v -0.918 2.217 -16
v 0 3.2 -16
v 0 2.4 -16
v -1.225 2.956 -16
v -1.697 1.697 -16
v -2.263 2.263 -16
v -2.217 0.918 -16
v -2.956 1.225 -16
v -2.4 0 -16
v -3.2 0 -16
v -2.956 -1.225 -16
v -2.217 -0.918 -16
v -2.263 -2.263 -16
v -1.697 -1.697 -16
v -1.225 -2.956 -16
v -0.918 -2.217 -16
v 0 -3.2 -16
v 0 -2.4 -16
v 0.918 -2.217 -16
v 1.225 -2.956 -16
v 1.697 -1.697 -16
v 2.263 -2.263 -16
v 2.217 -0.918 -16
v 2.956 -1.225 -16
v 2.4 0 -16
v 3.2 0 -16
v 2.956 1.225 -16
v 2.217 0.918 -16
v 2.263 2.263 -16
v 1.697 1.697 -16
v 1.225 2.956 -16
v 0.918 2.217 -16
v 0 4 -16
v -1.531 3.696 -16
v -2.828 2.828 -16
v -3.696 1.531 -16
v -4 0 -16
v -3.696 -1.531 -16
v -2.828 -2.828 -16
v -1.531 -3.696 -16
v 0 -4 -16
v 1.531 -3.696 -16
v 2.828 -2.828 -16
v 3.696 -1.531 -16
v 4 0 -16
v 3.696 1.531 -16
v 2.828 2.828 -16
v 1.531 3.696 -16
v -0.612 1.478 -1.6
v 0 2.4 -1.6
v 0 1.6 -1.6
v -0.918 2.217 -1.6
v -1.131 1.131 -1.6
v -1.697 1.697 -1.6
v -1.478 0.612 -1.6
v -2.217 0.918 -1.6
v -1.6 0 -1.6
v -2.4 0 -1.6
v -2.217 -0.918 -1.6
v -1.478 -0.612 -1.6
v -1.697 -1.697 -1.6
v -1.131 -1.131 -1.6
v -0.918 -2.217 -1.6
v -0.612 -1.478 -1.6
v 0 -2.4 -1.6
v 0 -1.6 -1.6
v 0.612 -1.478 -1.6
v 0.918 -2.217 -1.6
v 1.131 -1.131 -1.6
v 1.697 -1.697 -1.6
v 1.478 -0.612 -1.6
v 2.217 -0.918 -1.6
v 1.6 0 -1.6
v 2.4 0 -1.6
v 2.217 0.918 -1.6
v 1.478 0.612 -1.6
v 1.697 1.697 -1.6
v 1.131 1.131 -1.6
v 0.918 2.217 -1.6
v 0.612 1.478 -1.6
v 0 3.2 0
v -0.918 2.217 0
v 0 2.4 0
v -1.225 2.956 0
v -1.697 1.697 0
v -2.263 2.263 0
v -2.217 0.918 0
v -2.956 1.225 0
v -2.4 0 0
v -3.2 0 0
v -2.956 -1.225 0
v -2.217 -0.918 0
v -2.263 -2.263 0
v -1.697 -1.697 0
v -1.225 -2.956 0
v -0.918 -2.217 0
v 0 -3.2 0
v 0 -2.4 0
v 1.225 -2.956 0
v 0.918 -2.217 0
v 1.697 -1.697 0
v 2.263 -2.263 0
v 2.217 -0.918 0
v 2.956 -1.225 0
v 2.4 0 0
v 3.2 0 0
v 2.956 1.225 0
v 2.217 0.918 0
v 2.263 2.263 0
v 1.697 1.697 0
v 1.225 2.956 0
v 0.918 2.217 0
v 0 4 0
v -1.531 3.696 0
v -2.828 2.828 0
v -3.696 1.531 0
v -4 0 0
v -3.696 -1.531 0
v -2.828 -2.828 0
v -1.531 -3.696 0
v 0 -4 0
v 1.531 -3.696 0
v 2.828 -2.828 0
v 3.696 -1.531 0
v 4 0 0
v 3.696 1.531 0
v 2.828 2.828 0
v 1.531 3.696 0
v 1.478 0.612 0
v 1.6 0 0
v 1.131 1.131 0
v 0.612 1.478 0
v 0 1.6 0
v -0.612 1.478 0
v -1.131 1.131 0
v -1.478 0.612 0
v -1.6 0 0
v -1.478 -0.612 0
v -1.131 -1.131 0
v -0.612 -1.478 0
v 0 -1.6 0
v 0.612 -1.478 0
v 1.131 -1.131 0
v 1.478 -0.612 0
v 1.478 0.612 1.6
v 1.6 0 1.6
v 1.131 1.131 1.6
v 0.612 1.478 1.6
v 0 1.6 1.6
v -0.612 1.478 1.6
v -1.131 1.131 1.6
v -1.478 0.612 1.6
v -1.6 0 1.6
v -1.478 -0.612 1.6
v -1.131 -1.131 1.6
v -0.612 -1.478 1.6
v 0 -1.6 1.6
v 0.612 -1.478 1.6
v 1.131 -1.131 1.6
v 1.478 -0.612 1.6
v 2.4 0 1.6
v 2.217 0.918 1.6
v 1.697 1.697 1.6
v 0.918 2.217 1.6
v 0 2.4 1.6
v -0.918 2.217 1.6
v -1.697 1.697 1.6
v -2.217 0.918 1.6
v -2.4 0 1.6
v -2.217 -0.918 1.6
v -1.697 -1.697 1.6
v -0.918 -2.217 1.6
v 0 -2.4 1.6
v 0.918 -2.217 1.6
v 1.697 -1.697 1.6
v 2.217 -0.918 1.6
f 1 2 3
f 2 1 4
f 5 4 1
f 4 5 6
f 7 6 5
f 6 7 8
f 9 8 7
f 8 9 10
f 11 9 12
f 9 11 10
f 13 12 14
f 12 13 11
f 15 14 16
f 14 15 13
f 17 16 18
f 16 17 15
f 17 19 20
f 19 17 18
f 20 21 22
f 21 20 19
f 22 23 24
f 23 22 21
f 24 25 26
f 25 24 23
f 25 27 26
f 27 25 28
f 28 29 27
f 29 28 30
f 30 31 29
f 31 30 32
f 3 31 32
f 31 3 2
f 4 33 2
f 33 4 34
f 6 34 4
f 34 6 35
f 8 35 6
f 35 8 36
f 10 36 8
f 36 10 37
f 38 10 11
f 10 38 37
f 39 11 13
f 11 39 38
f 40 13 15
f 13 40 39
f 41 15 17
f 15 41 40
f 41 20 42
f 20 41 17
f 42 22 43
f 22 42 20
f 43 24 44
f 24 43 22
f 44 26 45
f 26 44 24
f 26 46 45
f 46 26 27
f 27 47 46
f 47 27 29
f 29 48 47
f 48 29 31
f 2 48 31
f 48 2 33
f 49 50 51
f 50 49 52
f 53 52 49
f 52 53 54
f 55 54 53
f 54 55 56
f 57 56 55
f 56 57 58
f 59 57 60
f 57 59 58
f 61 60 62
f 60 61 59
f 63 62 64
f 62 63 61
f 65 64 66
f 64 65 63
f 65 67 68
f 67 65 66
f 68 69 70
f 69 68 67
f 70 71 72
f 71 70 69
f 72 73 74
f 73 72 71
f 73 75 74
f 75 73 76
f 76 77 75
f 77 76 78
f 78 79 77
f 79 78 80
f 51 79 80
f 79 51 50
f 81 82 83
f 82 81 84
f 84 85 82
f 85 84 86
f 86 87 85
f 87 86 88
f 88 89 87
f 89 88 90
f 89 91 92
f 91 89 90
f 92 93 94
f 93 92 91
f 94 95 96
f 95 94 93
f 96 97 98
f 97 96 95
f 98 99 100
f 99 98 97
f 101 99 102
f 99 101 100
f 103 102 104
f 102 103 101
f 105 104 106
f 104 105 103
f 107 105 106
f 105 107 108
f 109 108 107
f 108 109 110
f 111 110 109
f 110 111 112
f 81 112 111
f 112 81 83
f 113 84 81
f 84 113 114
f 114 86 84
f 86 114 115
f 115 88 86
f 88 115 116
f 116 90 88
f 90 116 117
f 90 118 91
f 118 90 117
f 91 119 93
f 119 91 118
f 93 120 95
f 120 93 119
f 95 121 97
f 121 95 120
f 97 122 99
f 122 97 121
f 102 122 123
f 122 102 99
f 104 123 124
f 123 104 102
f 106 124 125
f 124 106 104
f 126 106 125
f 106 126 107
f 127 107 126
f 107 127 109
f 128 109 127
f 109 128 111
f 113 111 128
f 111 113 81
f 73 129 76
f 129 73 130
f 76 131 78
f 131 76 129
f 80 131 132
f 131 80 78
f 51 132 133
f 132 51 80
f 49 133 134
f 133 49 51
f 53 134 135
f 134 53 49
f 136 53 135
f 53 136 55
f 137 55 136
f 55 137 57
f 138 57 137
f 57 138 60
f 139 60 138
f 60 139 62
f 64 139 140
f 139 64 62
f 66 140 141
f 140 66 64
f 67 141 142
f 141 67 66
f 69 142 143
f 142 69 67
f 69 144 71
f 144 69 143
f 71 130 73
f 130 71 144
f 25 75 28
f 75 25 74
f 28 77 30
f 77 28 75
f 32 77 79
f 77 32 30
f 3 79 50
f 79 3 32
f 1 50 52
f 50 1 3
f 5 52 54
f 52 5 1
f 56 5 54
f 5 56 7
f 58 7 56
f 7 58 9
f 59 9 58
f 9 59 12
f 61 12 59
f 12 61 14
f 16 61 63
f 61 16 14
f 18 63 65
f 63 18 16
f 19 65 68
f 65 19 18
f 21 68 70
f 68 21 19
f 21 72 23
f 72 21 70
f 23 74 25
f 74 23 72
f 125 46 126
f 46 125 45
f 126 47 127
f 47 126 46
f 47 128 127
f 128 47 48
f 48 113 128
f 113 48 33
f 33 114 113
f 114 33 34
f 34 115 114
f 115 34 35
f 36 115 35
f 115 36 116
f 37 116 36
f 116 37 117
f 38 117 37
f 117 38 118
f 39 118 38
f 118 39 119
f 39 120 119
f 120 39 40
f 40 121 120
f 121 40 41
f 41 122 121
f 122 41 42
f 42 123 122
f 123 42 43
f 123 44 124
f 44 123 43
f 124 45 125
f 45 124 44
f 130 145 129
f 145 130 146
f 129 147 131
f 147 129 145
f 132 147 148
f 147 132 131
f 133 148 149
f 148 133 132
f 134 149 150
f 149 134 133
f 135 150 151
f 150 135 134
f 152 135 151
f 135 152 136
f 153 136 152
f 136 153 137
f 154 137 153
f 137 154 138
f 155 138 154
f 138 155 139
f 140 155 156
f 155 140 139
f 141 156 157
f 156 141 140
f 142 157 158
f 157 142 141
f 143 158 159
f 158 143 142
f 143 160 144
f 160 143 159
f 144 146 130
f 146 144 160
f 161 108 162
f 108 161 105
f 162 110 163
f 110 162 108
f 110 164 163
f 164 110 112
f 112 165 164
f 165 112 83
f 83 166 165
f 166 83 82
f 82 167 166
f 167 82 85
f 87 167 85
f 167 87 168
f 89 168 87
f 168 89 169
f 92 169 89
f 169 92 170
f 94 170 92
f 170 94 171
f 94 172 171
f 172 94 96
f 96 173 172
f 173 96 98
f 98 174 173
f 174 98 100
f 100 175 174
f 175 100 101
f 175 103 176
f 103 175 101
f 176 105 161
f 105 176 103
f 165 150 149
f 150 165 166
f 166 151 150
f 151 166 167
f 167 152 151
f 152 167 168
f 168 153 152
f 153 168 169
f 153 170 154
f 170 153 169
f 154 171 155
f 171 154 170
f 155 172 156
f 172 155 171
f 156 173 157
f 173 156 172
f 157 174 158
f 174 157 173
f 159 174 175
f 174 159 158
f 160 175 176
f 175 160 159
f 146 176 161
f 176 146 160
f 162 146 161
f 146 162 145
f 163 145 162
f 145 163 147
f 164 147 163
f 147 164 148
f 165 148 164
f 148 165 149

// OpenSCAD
// file: ../p/stud2a.scad
use <../lib.scad>
use <4-4cyli.scad>
use <4-4edge.scad>
use <4-4ring2.scad>
function ldraw_lib__stud2a() = [
// 0 Stud Open without Base Edges
// 0 Name: stud2a.dat
// 0 Author: James Jessiman
// 0 !LDRAW_ORG Primitive UPDATE 2009-02
// 0 !LICENSE Licensed under CC BY 4.0 : see CAreadme.txt
// 
// 0 BFC CERTIFY CCW
  [0,"BFC","CERTIFY"],
  [0,"BFC","CCW"],
// 
// 0 !HISTORY 1999-07-05 [PTadmin] Official Update 1999-05
// 0 !HISTORY 2002-04-04 [sbliss] Modified for BFC compliance
// 0 !HISTORY 2002-04-25 [PTadmin] Official Update 2002-02
// 0 !HISTORY 2007-06-24 [PTadmin] Header formatted for Contributor Agreement
// 0 !HISTORY 2008-07-01 [PTadmin] Official Update 2008-01
// 0 !HISTORY 2009-06-21 [cwdee] Update ring references to 4-4ring
// 0 !HISTORY 2009-09-03 [PTadmin] Official Update 2009-02
// 
// 
// 1 16 0 -4 0 4 0 0 0 1 0 0 0 4 4-4edge.dat
  [1,16,0,-4,0,4,0,0,0,1,0,0,0,4, ldraw_lib__4_4edge()],
// 1 16 0 -4 0 6 0 0 0 1 0 0 0 6 4-4edge.dat
  [1,16,0,-4,0,6,0,0,0,1,0,0,0,6, ldraw_lib__4_4edge()],
// 0 BFC INVERTNEXT
  [0,"BFC","INVERTNEXT"],
// 1 16 0 -4 0 4 0 0 0 4 0 0 0 4 4-4cyli.dat
  [1,16,0,-4,0,4,0,0,0,4,0,0,0,4, ldraw_lib__4_4cyli()],
// 1 16 0 -4 0 6 0 0 0 4 0 0 0 6 4-4cyli.dat
  [1,16,0,-4,0,6,0,0,0,4,0,0,0,6, ldraw_lib__4_4cyli()],
// 1 16 0 -4 0 2 0 0 0 1 0 0 0 2 4-4ring2.dat
  [1,16,0,-4,0,2,0,0,0,1,0,0,0,2, ldraw_lib__4_4ring2()],
// 0
];
module ldraw_lib__stud2a(step=0, col=false, unit=2/5, alt=false, line=0.2, solid=!$preview)
    makepoly(ldraw_lib__stud2a(), step=step, col=col, unit=unit, alt=alt, line=line, solid=solid);
ldraw_lib__stud2a(line=0.2);
// file: ../p/4-4ring4.scad
use <../lib.scad>
function ldraw_lib__4_4ring4() = [
// 0 Ring  4 x 1.0
// 0 Name: 4-4ring4.dat
// 0 Author: James Jessiman
// 0 !LDRAW_ORG Primitive UPDATE 2009-01
// 0 !LICENSE Licensed under CC BY 4.0 : see CAreadme.txt
// 
// 0 BFC CERTIFY CCW
  [0,"BFC","CERTIFY"],
  [0,"BFC","CCW"],
// 
// 0 !HISTORY 1998-12-15 [PTadmin] Official Update 1998-10
// 0 !HISTORY 2002-04-08 [BrickCaster] Modified for BFC compliance
// 0 !HISTORY 2002-04-25 [PTadmin] Official Update 2002-02
// 0 !HISTORY 2007-06-24 [PTadmin] Header formatted for Contributor Agreement
// 0 !HISTORY 2008-07-01 [PTadmin] Official Update 2008-01
// 0 !HISTORY 2008-08-26 [cwdee] Switch polygon winding and rename
// 0 !HISTORY 2009-05-02 [PTadmin] Official Update 2009-01
// 
// 
// 4 16 -1.9135 0 4.6195 -1.5308 0 3.6956 0 0 4 0 0 5
  [4,16,-1.9135,0,4.6195,-1.5308,0,3.6956,0,0,4,0,0,5],
// 4 16 -3.5355 0 3.5355 -2.8284 0 2.8284 -1.5308 0 3.6956 -1.9135 0 4.6195
  [4,16,-3.5355,0,3.5355,-2.8284,0,2.8284,-1.5308,0,3.6956,-1.9135,0,4.6195],
// 4 16 -4.6195 0 1.9135 -3.6956 0 1.5308 -2.8284 0 2.8284 -3.5355 0 3.5355
  [4,16,-4.6195,0,1.9135,-3.6956,0,1.5308,-2.8284,0,2.8284,-3.5355,0,3.5355],
// 4 16 -5 0 0 -4 0 0 -3.6956 0 1.5308 -4.6195 0 1.9135
  [4,16,-5,0,0,-4,0,0,-3.6956,0,1.5308,-4.6195,0,1.9135],
// 4 16 -4.6195 0 -1.9135 -3.6956 0 -1.5308 -4 0 0 -5 0 0
  [4,16,-4.6195,0,-1.9135,-3.6956,0,-1.5308,-4,0,0,-5,0,0],
// 4 16 -3.5355 0 -3.5355 -2.8284 0 -2.8284 -3.6956 0 -1.5308 -4.6195 0 -1.9135
  [4,16,-3.5355,0,-3.5355,-2.8284,0,-2.8284,-3.6956,0,-1.5308,-4.6195,0,-1.9135],
// 4 16 -1.9135 0 -4.6195 -1.5308 0 -3.6956 -2.8284 0 -2.8284 -3.5355 0 -3.5355
  [4,16,-1.9135,0,-4.6195,-1.5308,0,-3.6956,-2.8284,0,-2.8284,-3.5355,0,-3.5355],
// 4 16 0 0 -5 0 0 -4 -1.5308 0 -3.6956 -1.9135 0 -4.6195
  [4,16,0,0,-5,0,0,-4,-1.5308,0,-3.6956,-1.9135,0,-4.6195],
// 4 16 1.9135 0 -4.6195 1.5308 0 -3.6956 0 0 -4 0 0 -5
  [4,16,1.9135,0,-4.6195,1.5308,0,-3.6956,0,0,-4,0,0,-5],
// 4 16 3.5355 0 -3.5355 2.8284 0 -2.8284 1.5308 0 -3.6956 1.9135 0 -4.6195
  [4,16,3.5355,0,-3.5355,2.8284,0,-2.8284,1.5308,0,-3.6956,1.9135,0,-4.6195],
// 4 16 4.6195 0 -1.9135 3.6956 0 -1.5308 2.8284 0 -2.8284 3.5355 0 -3.5355
  [4,16,4.6195,0,-1.9135,3.6956,0,-1.5308,2.8284,0,-2.8284,3.5355,0,-3.5355],
// 4 16 5 0 0 4 0 0 3.6956 0 -1.5308 4.6195 0 -1.9135
  [4,16,5,0,0,4,0,0,3.6956,0,-1.5308,4.6195,0,-1.9135],
// 4 16 4.6195 0 1.9135 3.6956 0 1.5308 4 0 0 5 0 0
  [4,16,4.6195,0,1.9135,3.6956,0,1.5308,4,0,0,5,0,0],
// 4 16 3.5355 0 3.5355 2.8284 0 2.8284 3.6956 0 1.5308 4.6195 0 1.9135
  [4,16,3.5355,0,3.5355,2.8284,0,2.8284,3.6956,0,1.5308,4.6195,0,1.9135],
// 4 16 1.9135 0 4.6195 1.5308 0 3.6956 2.8284 0 2.8284 3.5355 0 3.5355
  [4,16,1.9135,0,4.6195,1.5308,0,3.6956,2.8284,0,2.8284,3.5355,0,3.5355],
// 4 16 0 0 5 0 0 4 1.5308 0 3.6956 1.9135 0 4.6195
  [4,16,0,0,5,0,0,4,1.5308,0,3.6956,1.9135,0,4.6195],
// 0
];
module ldraw_lib__4_4ring4(step=0, col=false, unit=2/5, alt=false, line=0.2, solid=!$preview)
    makepoly(ldraw_lib__4_4ring4(), step=step, col=col, unit=unit, alt=alt, line=line, solid=solid);
ldraw_lib__4_4ring4(line=0.2);
// file: ../p/4-4ring3.scad
use <../lib.scad>
function ldraw_lib__4_4ring3() = [
// 0 Ring  3 x 1.0
// 0 Name: 4-4ring3.dat
// 0 Author: James Jessiman
// 0 !LDRAW_ORG Primitive UPDATE 2009-01
// 0 !LICENSE Licensed under CC BY 4.0 : see CAreadme.txt
// 
// 0 BFC CERTIFY CCW
  [0,"BFC","CERTIFY"],
  [0,"BFC","CCW"],
// 
// 0 !HISTORY 1998-12-15 [PTadmin] Official Update 1998-10
// 0 !HISTORY 2002-04-05 [hafhead] Added BFC statement
// 0 !HISTORY 2002-04-25 [PTadmin] Official Update 2002-02
// 0 !HISTORY 2007-06-24 [PTadmin] Header formatted for Contributor Agreement
// 0 !HISTORY 2008-07-01 [PTadmin] Official Update 2008-01
// 0 !HISTORY 2008-08-26 [cwdee] Switch polygon winding and rename
// 0 !HISTORY 2009-05-02 [PTadmin] Official Update 2009-01
// 
// 
// 4 16 -1.5308 0 3.6956 -1.1481 0 2.7717 0 0 3 0 0 4
  [4,16,-1.5308,0,3.6956,-1.1481,0,2.7717,0,0,3,0,0,4],
// 4 16 -2.8284 0 2.8284 -2.1213 0 2.1213 -1.1481 0 2.7717 -1.5308 0 3.6956
  [4,16,-2.8284,0,2.8284,-2.1213,0,2.1213,-1.1481,0,2.7717,-1.5308,0,3.6956],
// 4 16 -3.6956 0 1.5308 -2.7717 0 1.1481 -2.1213 0 2.1213 -2.8284 0 2.8284
  [4,16,-3.6956,0,1.5308,-2.7717,0,1.1481,-2.1213,0,2.1213,-2.8284,0,2.8284],
// 4 16 -4 0 0 -3 0 0 -2.7717 0 1.1481 -3.6956 0 1.5308
  [4,16,-4,0,0,-3,0,0,-2.7717,0,1.1481,-3.6956,0,1.5308],
// 4 16 -3.6956 0 -1.5308 -2.7717 0 -1.1481 -3 0 0 -4 0 0
  [4,16,-3.6956,0,-1.5308,-2.7717,0,-1.1481,-3,0,0,-4,0,0],
// 4 16 -2.8284 0 -2.8284 -2.1213 0 -2.1213 -2.7717 0 -1.1481 -3.6956 0 -1.5308
  [4,16,-2.8284,0,-2.8284,-2.1213,0,-2.1213,-2.7717,0,-1.1481,-3.6956,0,-1.5308],
// 4 16 -1.5308 0 -3.6956 -1.1481 0 -2.7717 -2.1213 0 -2.1213 -2.8284 0 -2.8284
  [4,16,-1.5308,0,-3.6956,-1.1481,0,-2.7717,-2.1213,0,-2.1213,-2.8284,0,-2.8284],
// 4 16 0 0 -4 0 0 -3 -1.1481 0 -2.7717 -1.5308 0 -3.6956
  [4,16,0,0,-4,0,0,-3,-1.1481,0,-2.7717,-1.5308,0,-3.6956],
// 4 16 1.5308 0 -3.6956 1.1481 0 -2.7717 0 0 -3 0 0 -4
  [4,16,1.5308,0,-3.6956,1.1481,0,-2.7717,0,0,-3,0,0,-4],
// 4 16 2.8284 0 -2.8284 2.1213 0 -2.1213 1.1481 0 -2.7717 1.5308 0 -3.6956
  [4,16,2.8284,0,-2.8284,2.1213,0,-2.1213,1.1481,0,-2.7717,1.5308,0,-3.6956],
// 4 16 3.6956 0 -1.5308 2.7717 0 -1.1481 2.1213 0 -2.1213 2.8284 0 -2.8284
  [4,16,3.6956,0,-1.5308,2.7717,0,-1.1481,2.1213,0,-2.1213,2.8284,0,-2.8284],
// 4 16 4 0 0 3 0 0 2.7717 0 -1.1481 3.6956 0 -1.5308
  [4,16,4,0,0,3,0,0,2.7717,0,-1.1481,3.6956,0,-1.5308],
// 4 16 3.6956 0 1.5308 2.7717 0 1.1481 3 0 0 4 0 0
  [4,16,3.6956,0,1.5308,2.7717,0,1.1481,3,0,0,4,0,0],
// 4 16 2.8284 0 2.8284 2.1213 0 2.1213 2.7717 0 1.1481 3.6956 0 1.5308
  [4,16,2.8284,0,2.8284,2.1213,0,2.1213,2.7717,0,1.1481,3.6956,0,1.5308],
// 4 16 1.5308 0 3.6956 1.1481 0 2.7717 2.1213 0 2.1213 2.8284 0 2.8284
  [4,16,1.5308,0,3.6956,1.1481,0,2.7717,2.1213,0,2.1213,2.8284,0,2.8284],
// 4 16 0 0 4 0 0 3 1.1481 0 2.7717 1.5308 0 3.6956
  [4,16,0,0,4,0,0,3,1.1481,0,2.7717,1.5308,0,3.6956],
// 0
];
module ldraw_lib__4_4ring3(step=0, col=false, unit=2/5, alt=false, line=0.2, solid=!$preview)
    makepoly(ldraw_lib__4_4ring3(), step=step, col=col, unit=unit, alt=alt, line=line, solid=solid);
ldraw_lib__4_4ring3(line=0.2);
// file: ../p/4-4ring2.scad
use <../lib.scad>
function ldraw_lib__4_4ring2() = [
// 0 Ring  2 x 1.0
// 0 Name: 4-4ring2.dat
// 0 Author: James Jessiman
// 0 !LDRAW_ORG Primitive UPDATE 2009-01
// 0 !LICENSE Licensed under CC BY 4.0 : see CAreadme.txt
// 
// 0 BFC CERTIFY CCW
  [0,"BFC","CERTIFY"],
  [0,"BFC","CCW"],
// 
// 0 !HISTORY 1998-12-15 [PTadmin] Official Update 1998-10
// 0 !HISTORY 2002-04-05 [hafhead] Added BFC statement
// 0 !HISTORY 2002-04-25 [PTadmin] Official Update 2002-02
// 0 !HISTORY 2007-06-24 [PTadmin] Header formatted for Contributor Agreement
// 0 !HISTORY 2008-07-01 [PTadmin] Official Update 2008-01
// 0 !HISTORY 2008-08-26 [cwdee] Switch polygon winding and rename
// 0 !HISTORY 2009-05-02 [PTadmin] Official Update 2009-01
// 
// 
// 4 16 -1.1481 0 2.7717 -0.7654 0 1.8478 0 0 2 0 0 3
  [4,16,-1.1481,0,2.7717,-0.7654,0,1.8478,0,0,2,0,0,3],
// 4 16 -2.1213 0 2.1213 -1.4142 0 1.4142 -0.7654 0 1.8478 -1.1481 0 2.7717
  [4,16,-2.1213,0,2.1213,-1.4142,0,1.4142,-0.7654,0,1.8478,-1.1481,0,2.7717],
// 4 16 -2.7717 0 1.1481 -1.8478 0 0.7654 -1.4142 0 1.4142 -2.1213 0 2.1213
  [4,16,-2.7717,0,1.1481,-1.8478,0,0.7654,-1.4142,0,1.4142,-2.1213,0,2.1213],
// 4 16 -3 0 0 -2 0 0 -1.8478 0 0.7654 -2.7717 0 1.1481
  [4,16,-3,0,0,-2,0,0,-1.8478,0,0.7654,-2.7717,0,1.1481],
// 4 16 -2.7717 0 -1.1481 -1.8478 0 -0.7654 -2 0 0 -3 0 0
  [4,16,-2.7717,0,-1.1481,-1.8478,0,-0.7654,-2,0,0,-3,0,0],
// 4 16 -2.1213 0 -2.1213 -1.4142 0 -1.4142 -1.8478 0 -0.7654 -2.7717 0 -1.1481
  [4,16,-2.1213,0,-2.1213,-1.4142,0,-1.4142,-1.8478,0,-0.7654,-2.7717,0,-1.1481],
// 4 16 -1.1481 0 -2.7717 -0.7654 0 -1.8478 -1.4142 0 -1.4142 -2.1213 0 -2.1213
  [4,16,-1.1481,0,-2.7717,-0.7654,0,-1.8478,-1.4142,0,-1.4142,-2.1213,0,-2.1213],
// 4 16 0 0 -3 0 0 -2 -0.7654 0 -1.8478 -1.1481 0 -2.7717
  [4,16,0,0,-3,0,0,-2,-0.7654,0,-1.8478,-1.1481,0,-2.7717],
// 4 16 1.1481 0 -2.7717 0.7654 0 -1.8478 0 0 -2 0 0 -3
  [4,16,1.1481,0,-2.7717,0.7654,0,-1.8478,0,0,-2,0,0,-3],
// 4 16 2.1213 0 -2.1213 1.4142 0 -1.4142 0.7654 0 -1.8478 1.1481 0 -2.7717
  [4,16,2.1213,0,-2.1213,1.4142,0,-1.4142,0.7654,0,-1.8478,1.1481,0,-2.7717],
// 4 16 2.7717 0 -1.1481 1.8478 0 -0.7654 1.4142 0 -1.4142 2.1213 0 -2.1213
  [4,16,2.7717,0,-1.1481,1.8478,0,-0.7654,1.4142,0,-1.4142,2.1213,0,-2.1213],
// 4 16 3 0 0 2 0 0 1.8478 0 -0.7654 2.7717 0 -1.1481
  [4,16,3,0,0,2,0,0,1.8478,0,-0.7654,2.7717,0,-1.1481],
// 4 16 2.7717 0 1.1481 1.8478 0 0.7654 2 0 0 3 0 0
  [4,16,2.7717,0,1.1481,1.8478,0,0.7654,2,0,0,3,0,0],
// 4 16 2.1213 0 2.1213 1.4142 0 1.4142 1.8478 0 0.7654 2.7717 0 1.1481
  [4,16,2.1213,0,2.1213,1.4142,0,1.4142,1.8478,0,0.7654,2.7717,0,1.1481],
// 4 16 1.1481 0 2.7717 0.7654 0 1.8478 1.4142 0 1.4142 2.1213 0 2.1213
  [4,16,1.1481,0,2.7717,0.7654,0,1.8478,1.4142,0,1.4142,2.1213,0,2.1213],
// 4 16 0 0 3 0 0 2 0.7654 0 1.8478 1.1481 0 2.7717
  [4,16,0,0,3,0,0,2,0.7654,0,1.8478,1.1481,0,2.7717],
// 0
];
module ldraw_lib__4_4ring2(step=0, col=false, unit=2/5, alt=false, line=0.2, solid=!$preview)
    makepoly(ldraw_lib__4_4ring2(), step=step, col=col, unit=unit, alt=alt, line=line, solid=solid);
ldraw_lib__4_4ring2(line=0.2);
// file: ../p/4-4edge.scad
use <../lib.scad>
function ldraw_lib__4_4edge() = [
// 0 Circle 1.0
// 0 Name: 4-4edge.dat
// 0 Author: James Jessiman
// 0 !LDRAW_ORG Primitive UPDATE 2017-01
// 0 !LICENSE Licensed under CC BY 4.0 : see CAreadme.txt
// 
// 0 BFC CERTIFY CCW
  [0,"BFC","CERTIFY"],
  [0,"BFC","CCW"],
// 
// 0 !HISTORY 1998-12-15 [PTadmin] Official Update 1998-10
// 0 !HISTORY 2005-12-28 [PTadmin] Official Update 2005-01
// 0 !HISTORY 2007-06-24 [PTadmin] Header formatted for Contributor Agreement
// 0 !HISTORY 2008-07-01 [PTadmin] Official Update 2008-01
// 0 !HISTORY 2017-01-15 [Steffen] BFCed
// 0 !HISTORY 2017-12-30 [PTadmin] Official Update 2017-01
// 
// 
// 2 24 1 0 0 0.9239 0 0.3827
  [2,24,1,0,0,0.9239,0,0.3827],
// 2 24 0.9239 0 0.3827 0.7071 0 0.7071
  [2,24,0.9239,0,0.3827,0.7071,0,0.7071],
// 2 24 0.7071 0 0.7071 0.3827 0 0.9239
  [2,24,0.7071,0,0.7071,0.3827,0,0.9239],
// 2 24 0.3827 0 0.9239 0 0 1
  [2,24,0.3827,0,0.9239,0,0,1],
// 2 24 0 0 1 -0.3827 0 0.9239
  [2,24,0,0,1,-0.3827,0,0.9239],
// 2 24 -0.3827 0 0.9239 -0.7071 0 0.7071
  [2,24,-0.3827,0,0.9239,-0.7071,0,0.7071],
// 2 24 -0.7071 0 0.7071 -0.9239 0 0.3827
  [2,24,-0.7071,0,0.7071,-0.9239,0,0.3827],
// 2 24 -0.9239 0 0.3827 -1 0 -0
  [2,24,-0.9239,0,0.3827,-1,0,-0],
// 2 24 -1 0 -0 -0.9239 0 -0.3827
  [2,24,-1,0,-0,-0.9239,0,-0.3827],
// 2 24 -0.9239 0 -0.3827 -0.7071 0 -0.7071
  [2,24,-0.9239,0,-0.3827,-0.7071,0,-0.7071],
// 2 24 -0.7071 0 -0.7071 -0.3827 0 -0.9239
  [2,24,-0.7071,0,-0.7071,-0.3827,0,-0.9239],
// 2 24 -0.3827 0 -0.9239 0 0 -1
  [2,24,-0.3827,0,-0.9239,0,0,-1],
// 2 24 0 0 -1 0.3827 0 -0.9239
  [2,24,0,0,-1,0.3827,0,-0.9239],
// 2 24 0.3827 0 -0.9239 0.7071 0 -0.7071
  [2,24,0.3827,0,-0.9239,0.7071,0,-0.7071],
// 2 24 0.7071 0 -0.7071 0.9239 0 -0.3827
  [2,24,0.7071,0,-0.7071,0.9239,0,-0.3827],
// 2 24 0.9239 0 -0.3827 1 0 0
  [2,24,0.9239,0,-0.3827,1,0,0],
];
module ldraw_lib__4_4edge(step=0, col=false, unit=2/5, alt=false, line=0.2, solid=!$preview)
    makepoly(ldraw_lib__4_4edge(), step=step, col=col, unit=unit, alt=alt, line=line, solid=solid);
ldraw_lib__4_4edge(line=0.2);
// file: ../p/4-4cyli.scad
use <../lib.scad>
function ldraw_lib__4_4cyli() = [
// 0 Cylinder 1.0
// 0 Name: 4-4cyli.dat
// 0 Author: James Jessiman
// 0 !LDRAW_ORG Primitive UPDATE 2005-01
// 0 !LICENSE Licensed under CC BY 4.0 : see CAreadme.txt
// 
// 0 BFC CERTIFY CCW
  [0,"BFC","CERTIFY"],
  [0,"BFC","CCW"],
// 
// 0 !HISTORY 1998-12-15 [PTadmin] Official Update 1998-10
// 0 !HISTORY 2002-03-23 [sbliss] Added BFC statement; merged headers from files in distributions LDraw 0.27 and Complete.
// 0 !HISTORY 2002-04-25 [PTadmin] Official Update 2002-02
// 0 !HISTORY 2004-12-14 [guyvivan] BFC CCW
// 0 !HISTORY 2005-12-28 [PTadmin] Official Update 2005-01
// 0 !HISTORY 2007-06-24 [PTadmin] Header formatted for Contributor Agreement
// 0 !HISTORY 2008-07-01 [PTadmin] Official Update 2008-01
// 
// 
// 4 16 1 1 0 0.9239 1 0.3827 0.9239 0 0.3827 1 0 0
  [4,16,1,1,0,0.9239,1,0.3827,0.9239,0,0.3827,1,0,0],
// 5 24 1 0 0 1 1 0 0.9239 0 0.3827 0.9239 0 -0.3827
  [5,24,1,0,0,1,1,0,0.9239,0,0.3827,0.9239,0,-0.3827],
// 4 16 0.9239 1 0.3827 0.7071 1 0.7071 0.7071 0 0.7071 0.9239 0 0.3827
  [4,16,0.9239,1,0.3827,0.7071,1,0.7071,0.7071,0,0.7071,0.9239,0,0.3827],
// 5 24 0.9239 0 0.3827 0.9239 1 0.3827 0.7071 0 0.7071 1 0 0
  [5,24,0.9239,0,0.3827,0.9239,1,0.3827,0.7071,0,0.7071,1,0,0],
// 4 16 0.7071 1 0.7071 0.3827 1 0.9239 0.3827 0 0.9239 0.7071 0 0.7071
  [4,16,0.7071,1,0.7071,0.3827,1,0.9239,0.3827,0,0.9239,0.7071,0,0.7071],
// 5 24 0.7071 0 0.7071 0.7071 1 0.7071 0.3827 0 0.9239 0.9239 0 0.3827
  [5,24,0.7071,0,0.7071,0.7071,1,0.7071,0.3827,0,0.9239,0.9239,0,0.3827],
// 4 16 0.3827 1 0.9239 0 1 1 0 0 1 0.3827 0 0.9239
  [4,16,0.3827,1,0.9239,0,1,1,0,0,1,0.3827,0,0.9239],
// 5 24 0.3827 0 0.9239 0.3827 1 0.9239 0 0 1 0.7071 0 0.7071
  [5,24,0.3827,0,0.9239,0.3827,1,0.9239,0,0,1,0.7071,0,0.7071],
// 4 16 0 1 1 -0.3827 1 0.9239 -0.3827 0 0.9239 0 0 1
  [4,16,0,1,1,-0.3827,1,0.9239,-0.3827,0,0.9239,0,0,1],
// 5 24 0 0 1 0 1 1 -0.3827 0 0.9239 0.3827 0 0.9239
  [5,24,0,0,1,0,1,1,-0.3827,0,0.9239,0.3827,0,0.9239],
// 4 16 -0.3827 1 0.9239 -0.7071 1 0.7071 -0.7071 0 0.7071 -0.3827 0 0.9239
  [4,16,-0.3827,1,0.9239,-0.7071,1,0.7071,-0.7071,0,0.7071,-0.3827,0,0.9239],
// 5 24 -0.3827 0 0.9239 -0.3827 1 0.9239 -0.7071 0 0.7071 0 0 1
  [5,24,-0.3827,0,0.9239,-0.3827,1,0.9239,-0.7071,0,0.7071,0,0,1],
// 4 16 -0.7071 1 0.7071 -0.9239 1 0.3827 -0.9239 0 0.3827 -0.7071 0 0.7071
  [4,16,-0.7071,1,0.7071,-0.9239,1,0.3827,-0.9239,0,0.3827,-0.7071,0,0.7071],
// 5 24 -0.7071 0 0.7071 -0.7071 1 0.7071 -0.9239 0 0.3827 -0.3827 0 0.9239
  [5,24,-0.7071,0,0.7071,-0.7071,1,0.7071,-0.9239,0,0.3827,-0.3827,0,0.9239],
// 4 16 -0.9239 1 0.3827 -1 1 0 -1 0 0 -0.9239 0 0.3827
  [4,16,-0.9239,1,0.3827,-1,1,0,-1,0,0,-0.9239,0,0.3827],
// 5 24 -0.9239 0 0.3827 -0.9239 1 0.3827 -1 0 0 -0.7071 0 0.7071
  [5,24,-0.9239,0,0.3827,-0.9239,1,0.3827,-1,0,0,-0.7071,0,0.7071],
// 4 16 -1 1 0 -0.9239 1 -0.3827 -0.9239 0 -0.3827 -1 0 0
  [4,16,-1,1,0,-0.9239,1,-0.3827,-0.9239,0,-0.3827,-1,0,0],
// 5 24 -1 0 0 -1 1 0 -0.9239 0 -0.3827 -0.9239 0 0.3827
  [5,24,-1,0,0,-1,1,0,-0.9239,0,-0.3827,-0.9239,0,0.3827],
// 4 16 -0.9239 1 -0.3827 -0.7071 1 -0.7071 -0.7071 0 -0.7071 -0.9239 0 -0.3827
  [4,16,-0.9239,1,-0.3827,-0.7071,1,-0.7071,-0.7071,0,-0.7071,-0.9239,0,-0.3827],
// 5 24 -0.9239 0 -0.3827 -0.9239 1 -0.3827 -0.7071 0 -0.7071 -1 0 0
  [5,24,-0.9239,0,-0.3827,-0.9239,1,-0.3827,-0.7071,0,-0.7071,-1,0,0],
// 4 16 -0.7071 1 -0.7071 -0.3827 1 -0.9239 -0.3827 0 -0.9239 -0.7071 0 -0.7071
  [4,16,-0.7071,1,-0.7071,-0.3827,1,-0.9239,-0.3827,0,-0.9239,-0.7071,0,-0.7071],
// 5 24 -0.7071 0 -0.7071 -0.7071 1 -0.7071 -0.3827 0 -0.9239 -0.9239 0 -0.3827
  [5,24,-0.7071,0,-0.7071,-0.7071,1,-0.7071,-0.3827,0,-0.9239,-0.9239,0,-0.3827],
// 4 16 -0.3827 1 -0.9239 0 1 -1 0 0 -1 -0.3827 0 -0.9239
  [4,16,-0.3827,1,-0.9239,0,1,-1,0,0,-1,-0.3827,0,-0.9239],
// 5 24 -0.3827 0 -0.9239 -0.3827 1 -0.9239 0 0 -1 -0.7071 0 -0.7071
  [5,24,-0.3827,0,-0.9239,-0.3827,1,-0.9239,0,0,-1,-0.7071,0,-0.7071],
// 4 16 0 1 -1 0.3827 1 -0.9239 0.3827 0 -0.9239 0 0 -1
  [4,16,0,1,-1,0.3827,1,-0.9239,0.3827,0,-0.9239,0,0,-1],
// 5 24 0 0 -1 0 1 -1 0.3827 0 -0.9239 -0.3827 0 -0.9239
  [5,24,0,0,-1,0,1,-1,0.3827,0,-0.9239,-0.3827,0,-0.9239],
// 4 16 0.3827 1 -0.9239 0.7071 1 -0.7071 0.7071 0 -0.7071 0.3827 0 -0.9239
  [4,16,0.3827,1,-0.9239,0.7071,1,-0.7071,0.7071,0,-0.7071,0.3827,0,-0.9239],
// 5 24 0.3827 0 -0.9239 0.3827 1 -0.9239 0.7071 0 -0.7071 0 0 -1
  [5,24,0.3827,0,-0.9239,0.3827,1,-0.9239,0.7071,0,-0.7071,0,0,-1],
// 4 16 0.7071 1 -0.7071 0.9239 1 -0.3827 0.9239 0 -0.3827 0.7071 0 -0.7071
  [4,16,0.7071,1,-0.7071,0.9239,1,-0.3827,0.9239,0,-0.3827,0.7071,0,-0.7071],
// 5 24 0.7071 0 -0.7071 0.7071 1 -0.7071 0.9239 0 -0.3827 0.3827 0 -0.9239
  [5,24,0.7071,0,-0.7071,0.7071,1,-0.7071,0.9239,0,-0.3827,0.3827,0,-0.9239],
// 4 16 0.9239 1 -0.3827 1 1 0 1 0 0 0.9239 0 -0.3827
  [4,16,0.9239,1,-0.3827,1,1,0,1,0,0,0.9239,0,-0.3827],
// 5 24 0.9239 0 -0.3827 0.9239 1 -0.3827 1 0 0 0.7071 0 -0.7071
  [5,24,0.9239,0,-0.3827,0.9239,1,-0.3827,1,0,0,0.7071,0,-0.7071],
// 0
];
module ldraw_lib__4_4cyli(step=0, col=false, unit=2/5, alt=false, line=0.2, solid=!$preview)
    makepoly(ldraw_lib__4_4cyli(), step=step, col=col, unit=unit, alt=alt, line=line, solid=solid);
ldraw_lib__4_4cyli(line=0.2);
// main file
use <../lib.scad>
use <../p/4-4cyli.scad>
use <../p/4-4edge.scad>
use <../p/4-4ring2.scad>
use <../p/4-4ring3.scad>
use <../p/4-4ring4.scad>
use <../p/stud2a.scad>
function ldraw_lib__71075a() = [
// 0 Brick  1 x  1 x  1.667 Round
// 0 Name: 71075a.dat
// 0 Author: James Jessiman
// 0 !LDRAW_ORG Part UPDATE 2010-01
// 0 !LICENSE Licensed under CC BY 4.0 : see CAreadme.txt
// 
// 0 BFC CERTIFY CCW
  [0,"BFC","CERTIFY"],
  [0,"BFC","CCW"],
// 
// 0 !HISTORY 1998-06-20 [PTadmin] Official Update 1998-06
// 0 !HISTORY 2007-10-12 [PTadmin] Header formatted for Contributor Agreement
// 0 !HISTORY 2008-07-01 [PTadmin] Official Update 2008-01
// 0 !HISTORY 2008-07-07 [jriley] Made BFC compliant
// 0 !HISTORY 2008-07-07 [guyvivan] Fixed header and author
// 0 !HISTORY 2009-05-21 [PTadmin] Renamed from 71076. Part number really is 71075, but was mistakenly issued as 71076
// 0 !HISTORY 2010-04-05 [PTadmin] Official Update 2010-01
// 
// 
// 1 16 0 40 0 6 0 0 0 1 0 0 0 6 4-4edge.dat
  [1,16,0,40,0,6,0,0,0,1,0,0,0,6, ldraw_lib__4_4edge()],
// 1 16 0 40 0 10 0 0 0 1 0 0 0 10 4-4edge.dat
  [1,16,0,40,0,10,0,0,0,1,0,0,0,10, ldraw_lib__4_4edge()],
// 1 16 0 4 0 4 0 0 0 1 0 0 0 4 4-4edge.dat
  [1,16,0,4,0,4,0,0,0,1,0,0,0,4, ldraw_lib__4_4edge()],
// 1 16 0 4 0 6 0 0 0 1 0 0 0 6 4-4edge.dat
  [1,16,0,4,0,6,0,0,0,1,0,0,0,6, ldraw_lib__4_4edge()],
// 1 16 0 0 0 6 0 0 0 1 0 0 0 6 4-4edge.dat
  [1,16,0,0,0,6,0,0,0,1,0,0,0,6, ldraw_lib__4_4edge()],
// 1 16 0 0 0 10 0 0 0 1 0 0 0 10 4-4edge.dat
  [1,16,0,0,0,10,0,0,0,1,0,0,0,10, ldraw_lib__4_4edge()],
// 1 16 0 40 0 2 0 0 0 -1 0 0 0 2 4-4ring3.dat
  [1,16,0,40,0,2,0,0,0,-1,0,0,0,2, ldraw_lib__4_4ring3()],
// 1 16 0 40 0 2 0 0 0 -1 0 0 0 2 4-4ring4.dat
  [1,16,0,40,0,2,0,0,0,-1,0,0,0,2, ldraw_lib__4_4ring4()],
// 1 16 0 4 0 2 0 0 0 -1 0 0 0 2 4-4ring2.dat
  [1,16,0,4,0,2,0,0,0,-1,0,0,0,2, ldraw_lib__4_4ring2()],
// 1 16 0 0 0 2 0 0 0 1 0 0 0 2 4-4ring3.dat
  [1,16,0,0,0,2,0,0,0,1,0,0,0,2, ldraw_lib__4_4ring3()],
// 1 16 0 0 0 2 0 0 0 1 0 0 0 2 4-4ring4.dat
  [1,16,0,0,0,2,0,0,0,1,0,0,0,2, ldraw_lib__4_4ring4()],
// 0 BFC INVERTNEXT
  [0,"BFC","INVERTNEXT"],
// 1 16 0 0 0 4 0 0 0 4 0 0 0 4 4-4cyli.dat
  [1,16,0,0,0,4,0,0,0,4,0,0,0,4, ldraw_lib__4_4cyli()],
// 0 BFC INVERTNEXT
  [0,"BFC","INVERTNEXT"],
// 1 16 0 4 0 6 0 0 0 36 0 0 0 6 4-4cyli.dat
  [1,16,0,4,0,6,0,0,0,36,0,0,0,6, ldraw_lib__4_4cyli()],
// 1 16 0 0 0 10 0 0 0 40 0 0 0 10 4-4cyli.dat
  [1,16,0,0,0,10,0,0,0,40,0,0,0,10, ldraw_lib__4_4cyli()],
// 1 16 0 0 0 1 0 0 0 1 0 0 0 1 stud2a.dat
  [1,16,0,0,0,1,0,0,0,1,0,0,0,1, ldraw_lib__stud2a()],
// 0
];
module ldraw_lib__71075a(step=0, col=false, unit=2/5, alt=false, line=0.2, solid=!$preview)
    makepoly(ldraw_lib__71075a(), step=step, col=col, unit=unit, alt=alt, line=line, solid=solid);
ldraw_lib__71075a(line=0.2);
